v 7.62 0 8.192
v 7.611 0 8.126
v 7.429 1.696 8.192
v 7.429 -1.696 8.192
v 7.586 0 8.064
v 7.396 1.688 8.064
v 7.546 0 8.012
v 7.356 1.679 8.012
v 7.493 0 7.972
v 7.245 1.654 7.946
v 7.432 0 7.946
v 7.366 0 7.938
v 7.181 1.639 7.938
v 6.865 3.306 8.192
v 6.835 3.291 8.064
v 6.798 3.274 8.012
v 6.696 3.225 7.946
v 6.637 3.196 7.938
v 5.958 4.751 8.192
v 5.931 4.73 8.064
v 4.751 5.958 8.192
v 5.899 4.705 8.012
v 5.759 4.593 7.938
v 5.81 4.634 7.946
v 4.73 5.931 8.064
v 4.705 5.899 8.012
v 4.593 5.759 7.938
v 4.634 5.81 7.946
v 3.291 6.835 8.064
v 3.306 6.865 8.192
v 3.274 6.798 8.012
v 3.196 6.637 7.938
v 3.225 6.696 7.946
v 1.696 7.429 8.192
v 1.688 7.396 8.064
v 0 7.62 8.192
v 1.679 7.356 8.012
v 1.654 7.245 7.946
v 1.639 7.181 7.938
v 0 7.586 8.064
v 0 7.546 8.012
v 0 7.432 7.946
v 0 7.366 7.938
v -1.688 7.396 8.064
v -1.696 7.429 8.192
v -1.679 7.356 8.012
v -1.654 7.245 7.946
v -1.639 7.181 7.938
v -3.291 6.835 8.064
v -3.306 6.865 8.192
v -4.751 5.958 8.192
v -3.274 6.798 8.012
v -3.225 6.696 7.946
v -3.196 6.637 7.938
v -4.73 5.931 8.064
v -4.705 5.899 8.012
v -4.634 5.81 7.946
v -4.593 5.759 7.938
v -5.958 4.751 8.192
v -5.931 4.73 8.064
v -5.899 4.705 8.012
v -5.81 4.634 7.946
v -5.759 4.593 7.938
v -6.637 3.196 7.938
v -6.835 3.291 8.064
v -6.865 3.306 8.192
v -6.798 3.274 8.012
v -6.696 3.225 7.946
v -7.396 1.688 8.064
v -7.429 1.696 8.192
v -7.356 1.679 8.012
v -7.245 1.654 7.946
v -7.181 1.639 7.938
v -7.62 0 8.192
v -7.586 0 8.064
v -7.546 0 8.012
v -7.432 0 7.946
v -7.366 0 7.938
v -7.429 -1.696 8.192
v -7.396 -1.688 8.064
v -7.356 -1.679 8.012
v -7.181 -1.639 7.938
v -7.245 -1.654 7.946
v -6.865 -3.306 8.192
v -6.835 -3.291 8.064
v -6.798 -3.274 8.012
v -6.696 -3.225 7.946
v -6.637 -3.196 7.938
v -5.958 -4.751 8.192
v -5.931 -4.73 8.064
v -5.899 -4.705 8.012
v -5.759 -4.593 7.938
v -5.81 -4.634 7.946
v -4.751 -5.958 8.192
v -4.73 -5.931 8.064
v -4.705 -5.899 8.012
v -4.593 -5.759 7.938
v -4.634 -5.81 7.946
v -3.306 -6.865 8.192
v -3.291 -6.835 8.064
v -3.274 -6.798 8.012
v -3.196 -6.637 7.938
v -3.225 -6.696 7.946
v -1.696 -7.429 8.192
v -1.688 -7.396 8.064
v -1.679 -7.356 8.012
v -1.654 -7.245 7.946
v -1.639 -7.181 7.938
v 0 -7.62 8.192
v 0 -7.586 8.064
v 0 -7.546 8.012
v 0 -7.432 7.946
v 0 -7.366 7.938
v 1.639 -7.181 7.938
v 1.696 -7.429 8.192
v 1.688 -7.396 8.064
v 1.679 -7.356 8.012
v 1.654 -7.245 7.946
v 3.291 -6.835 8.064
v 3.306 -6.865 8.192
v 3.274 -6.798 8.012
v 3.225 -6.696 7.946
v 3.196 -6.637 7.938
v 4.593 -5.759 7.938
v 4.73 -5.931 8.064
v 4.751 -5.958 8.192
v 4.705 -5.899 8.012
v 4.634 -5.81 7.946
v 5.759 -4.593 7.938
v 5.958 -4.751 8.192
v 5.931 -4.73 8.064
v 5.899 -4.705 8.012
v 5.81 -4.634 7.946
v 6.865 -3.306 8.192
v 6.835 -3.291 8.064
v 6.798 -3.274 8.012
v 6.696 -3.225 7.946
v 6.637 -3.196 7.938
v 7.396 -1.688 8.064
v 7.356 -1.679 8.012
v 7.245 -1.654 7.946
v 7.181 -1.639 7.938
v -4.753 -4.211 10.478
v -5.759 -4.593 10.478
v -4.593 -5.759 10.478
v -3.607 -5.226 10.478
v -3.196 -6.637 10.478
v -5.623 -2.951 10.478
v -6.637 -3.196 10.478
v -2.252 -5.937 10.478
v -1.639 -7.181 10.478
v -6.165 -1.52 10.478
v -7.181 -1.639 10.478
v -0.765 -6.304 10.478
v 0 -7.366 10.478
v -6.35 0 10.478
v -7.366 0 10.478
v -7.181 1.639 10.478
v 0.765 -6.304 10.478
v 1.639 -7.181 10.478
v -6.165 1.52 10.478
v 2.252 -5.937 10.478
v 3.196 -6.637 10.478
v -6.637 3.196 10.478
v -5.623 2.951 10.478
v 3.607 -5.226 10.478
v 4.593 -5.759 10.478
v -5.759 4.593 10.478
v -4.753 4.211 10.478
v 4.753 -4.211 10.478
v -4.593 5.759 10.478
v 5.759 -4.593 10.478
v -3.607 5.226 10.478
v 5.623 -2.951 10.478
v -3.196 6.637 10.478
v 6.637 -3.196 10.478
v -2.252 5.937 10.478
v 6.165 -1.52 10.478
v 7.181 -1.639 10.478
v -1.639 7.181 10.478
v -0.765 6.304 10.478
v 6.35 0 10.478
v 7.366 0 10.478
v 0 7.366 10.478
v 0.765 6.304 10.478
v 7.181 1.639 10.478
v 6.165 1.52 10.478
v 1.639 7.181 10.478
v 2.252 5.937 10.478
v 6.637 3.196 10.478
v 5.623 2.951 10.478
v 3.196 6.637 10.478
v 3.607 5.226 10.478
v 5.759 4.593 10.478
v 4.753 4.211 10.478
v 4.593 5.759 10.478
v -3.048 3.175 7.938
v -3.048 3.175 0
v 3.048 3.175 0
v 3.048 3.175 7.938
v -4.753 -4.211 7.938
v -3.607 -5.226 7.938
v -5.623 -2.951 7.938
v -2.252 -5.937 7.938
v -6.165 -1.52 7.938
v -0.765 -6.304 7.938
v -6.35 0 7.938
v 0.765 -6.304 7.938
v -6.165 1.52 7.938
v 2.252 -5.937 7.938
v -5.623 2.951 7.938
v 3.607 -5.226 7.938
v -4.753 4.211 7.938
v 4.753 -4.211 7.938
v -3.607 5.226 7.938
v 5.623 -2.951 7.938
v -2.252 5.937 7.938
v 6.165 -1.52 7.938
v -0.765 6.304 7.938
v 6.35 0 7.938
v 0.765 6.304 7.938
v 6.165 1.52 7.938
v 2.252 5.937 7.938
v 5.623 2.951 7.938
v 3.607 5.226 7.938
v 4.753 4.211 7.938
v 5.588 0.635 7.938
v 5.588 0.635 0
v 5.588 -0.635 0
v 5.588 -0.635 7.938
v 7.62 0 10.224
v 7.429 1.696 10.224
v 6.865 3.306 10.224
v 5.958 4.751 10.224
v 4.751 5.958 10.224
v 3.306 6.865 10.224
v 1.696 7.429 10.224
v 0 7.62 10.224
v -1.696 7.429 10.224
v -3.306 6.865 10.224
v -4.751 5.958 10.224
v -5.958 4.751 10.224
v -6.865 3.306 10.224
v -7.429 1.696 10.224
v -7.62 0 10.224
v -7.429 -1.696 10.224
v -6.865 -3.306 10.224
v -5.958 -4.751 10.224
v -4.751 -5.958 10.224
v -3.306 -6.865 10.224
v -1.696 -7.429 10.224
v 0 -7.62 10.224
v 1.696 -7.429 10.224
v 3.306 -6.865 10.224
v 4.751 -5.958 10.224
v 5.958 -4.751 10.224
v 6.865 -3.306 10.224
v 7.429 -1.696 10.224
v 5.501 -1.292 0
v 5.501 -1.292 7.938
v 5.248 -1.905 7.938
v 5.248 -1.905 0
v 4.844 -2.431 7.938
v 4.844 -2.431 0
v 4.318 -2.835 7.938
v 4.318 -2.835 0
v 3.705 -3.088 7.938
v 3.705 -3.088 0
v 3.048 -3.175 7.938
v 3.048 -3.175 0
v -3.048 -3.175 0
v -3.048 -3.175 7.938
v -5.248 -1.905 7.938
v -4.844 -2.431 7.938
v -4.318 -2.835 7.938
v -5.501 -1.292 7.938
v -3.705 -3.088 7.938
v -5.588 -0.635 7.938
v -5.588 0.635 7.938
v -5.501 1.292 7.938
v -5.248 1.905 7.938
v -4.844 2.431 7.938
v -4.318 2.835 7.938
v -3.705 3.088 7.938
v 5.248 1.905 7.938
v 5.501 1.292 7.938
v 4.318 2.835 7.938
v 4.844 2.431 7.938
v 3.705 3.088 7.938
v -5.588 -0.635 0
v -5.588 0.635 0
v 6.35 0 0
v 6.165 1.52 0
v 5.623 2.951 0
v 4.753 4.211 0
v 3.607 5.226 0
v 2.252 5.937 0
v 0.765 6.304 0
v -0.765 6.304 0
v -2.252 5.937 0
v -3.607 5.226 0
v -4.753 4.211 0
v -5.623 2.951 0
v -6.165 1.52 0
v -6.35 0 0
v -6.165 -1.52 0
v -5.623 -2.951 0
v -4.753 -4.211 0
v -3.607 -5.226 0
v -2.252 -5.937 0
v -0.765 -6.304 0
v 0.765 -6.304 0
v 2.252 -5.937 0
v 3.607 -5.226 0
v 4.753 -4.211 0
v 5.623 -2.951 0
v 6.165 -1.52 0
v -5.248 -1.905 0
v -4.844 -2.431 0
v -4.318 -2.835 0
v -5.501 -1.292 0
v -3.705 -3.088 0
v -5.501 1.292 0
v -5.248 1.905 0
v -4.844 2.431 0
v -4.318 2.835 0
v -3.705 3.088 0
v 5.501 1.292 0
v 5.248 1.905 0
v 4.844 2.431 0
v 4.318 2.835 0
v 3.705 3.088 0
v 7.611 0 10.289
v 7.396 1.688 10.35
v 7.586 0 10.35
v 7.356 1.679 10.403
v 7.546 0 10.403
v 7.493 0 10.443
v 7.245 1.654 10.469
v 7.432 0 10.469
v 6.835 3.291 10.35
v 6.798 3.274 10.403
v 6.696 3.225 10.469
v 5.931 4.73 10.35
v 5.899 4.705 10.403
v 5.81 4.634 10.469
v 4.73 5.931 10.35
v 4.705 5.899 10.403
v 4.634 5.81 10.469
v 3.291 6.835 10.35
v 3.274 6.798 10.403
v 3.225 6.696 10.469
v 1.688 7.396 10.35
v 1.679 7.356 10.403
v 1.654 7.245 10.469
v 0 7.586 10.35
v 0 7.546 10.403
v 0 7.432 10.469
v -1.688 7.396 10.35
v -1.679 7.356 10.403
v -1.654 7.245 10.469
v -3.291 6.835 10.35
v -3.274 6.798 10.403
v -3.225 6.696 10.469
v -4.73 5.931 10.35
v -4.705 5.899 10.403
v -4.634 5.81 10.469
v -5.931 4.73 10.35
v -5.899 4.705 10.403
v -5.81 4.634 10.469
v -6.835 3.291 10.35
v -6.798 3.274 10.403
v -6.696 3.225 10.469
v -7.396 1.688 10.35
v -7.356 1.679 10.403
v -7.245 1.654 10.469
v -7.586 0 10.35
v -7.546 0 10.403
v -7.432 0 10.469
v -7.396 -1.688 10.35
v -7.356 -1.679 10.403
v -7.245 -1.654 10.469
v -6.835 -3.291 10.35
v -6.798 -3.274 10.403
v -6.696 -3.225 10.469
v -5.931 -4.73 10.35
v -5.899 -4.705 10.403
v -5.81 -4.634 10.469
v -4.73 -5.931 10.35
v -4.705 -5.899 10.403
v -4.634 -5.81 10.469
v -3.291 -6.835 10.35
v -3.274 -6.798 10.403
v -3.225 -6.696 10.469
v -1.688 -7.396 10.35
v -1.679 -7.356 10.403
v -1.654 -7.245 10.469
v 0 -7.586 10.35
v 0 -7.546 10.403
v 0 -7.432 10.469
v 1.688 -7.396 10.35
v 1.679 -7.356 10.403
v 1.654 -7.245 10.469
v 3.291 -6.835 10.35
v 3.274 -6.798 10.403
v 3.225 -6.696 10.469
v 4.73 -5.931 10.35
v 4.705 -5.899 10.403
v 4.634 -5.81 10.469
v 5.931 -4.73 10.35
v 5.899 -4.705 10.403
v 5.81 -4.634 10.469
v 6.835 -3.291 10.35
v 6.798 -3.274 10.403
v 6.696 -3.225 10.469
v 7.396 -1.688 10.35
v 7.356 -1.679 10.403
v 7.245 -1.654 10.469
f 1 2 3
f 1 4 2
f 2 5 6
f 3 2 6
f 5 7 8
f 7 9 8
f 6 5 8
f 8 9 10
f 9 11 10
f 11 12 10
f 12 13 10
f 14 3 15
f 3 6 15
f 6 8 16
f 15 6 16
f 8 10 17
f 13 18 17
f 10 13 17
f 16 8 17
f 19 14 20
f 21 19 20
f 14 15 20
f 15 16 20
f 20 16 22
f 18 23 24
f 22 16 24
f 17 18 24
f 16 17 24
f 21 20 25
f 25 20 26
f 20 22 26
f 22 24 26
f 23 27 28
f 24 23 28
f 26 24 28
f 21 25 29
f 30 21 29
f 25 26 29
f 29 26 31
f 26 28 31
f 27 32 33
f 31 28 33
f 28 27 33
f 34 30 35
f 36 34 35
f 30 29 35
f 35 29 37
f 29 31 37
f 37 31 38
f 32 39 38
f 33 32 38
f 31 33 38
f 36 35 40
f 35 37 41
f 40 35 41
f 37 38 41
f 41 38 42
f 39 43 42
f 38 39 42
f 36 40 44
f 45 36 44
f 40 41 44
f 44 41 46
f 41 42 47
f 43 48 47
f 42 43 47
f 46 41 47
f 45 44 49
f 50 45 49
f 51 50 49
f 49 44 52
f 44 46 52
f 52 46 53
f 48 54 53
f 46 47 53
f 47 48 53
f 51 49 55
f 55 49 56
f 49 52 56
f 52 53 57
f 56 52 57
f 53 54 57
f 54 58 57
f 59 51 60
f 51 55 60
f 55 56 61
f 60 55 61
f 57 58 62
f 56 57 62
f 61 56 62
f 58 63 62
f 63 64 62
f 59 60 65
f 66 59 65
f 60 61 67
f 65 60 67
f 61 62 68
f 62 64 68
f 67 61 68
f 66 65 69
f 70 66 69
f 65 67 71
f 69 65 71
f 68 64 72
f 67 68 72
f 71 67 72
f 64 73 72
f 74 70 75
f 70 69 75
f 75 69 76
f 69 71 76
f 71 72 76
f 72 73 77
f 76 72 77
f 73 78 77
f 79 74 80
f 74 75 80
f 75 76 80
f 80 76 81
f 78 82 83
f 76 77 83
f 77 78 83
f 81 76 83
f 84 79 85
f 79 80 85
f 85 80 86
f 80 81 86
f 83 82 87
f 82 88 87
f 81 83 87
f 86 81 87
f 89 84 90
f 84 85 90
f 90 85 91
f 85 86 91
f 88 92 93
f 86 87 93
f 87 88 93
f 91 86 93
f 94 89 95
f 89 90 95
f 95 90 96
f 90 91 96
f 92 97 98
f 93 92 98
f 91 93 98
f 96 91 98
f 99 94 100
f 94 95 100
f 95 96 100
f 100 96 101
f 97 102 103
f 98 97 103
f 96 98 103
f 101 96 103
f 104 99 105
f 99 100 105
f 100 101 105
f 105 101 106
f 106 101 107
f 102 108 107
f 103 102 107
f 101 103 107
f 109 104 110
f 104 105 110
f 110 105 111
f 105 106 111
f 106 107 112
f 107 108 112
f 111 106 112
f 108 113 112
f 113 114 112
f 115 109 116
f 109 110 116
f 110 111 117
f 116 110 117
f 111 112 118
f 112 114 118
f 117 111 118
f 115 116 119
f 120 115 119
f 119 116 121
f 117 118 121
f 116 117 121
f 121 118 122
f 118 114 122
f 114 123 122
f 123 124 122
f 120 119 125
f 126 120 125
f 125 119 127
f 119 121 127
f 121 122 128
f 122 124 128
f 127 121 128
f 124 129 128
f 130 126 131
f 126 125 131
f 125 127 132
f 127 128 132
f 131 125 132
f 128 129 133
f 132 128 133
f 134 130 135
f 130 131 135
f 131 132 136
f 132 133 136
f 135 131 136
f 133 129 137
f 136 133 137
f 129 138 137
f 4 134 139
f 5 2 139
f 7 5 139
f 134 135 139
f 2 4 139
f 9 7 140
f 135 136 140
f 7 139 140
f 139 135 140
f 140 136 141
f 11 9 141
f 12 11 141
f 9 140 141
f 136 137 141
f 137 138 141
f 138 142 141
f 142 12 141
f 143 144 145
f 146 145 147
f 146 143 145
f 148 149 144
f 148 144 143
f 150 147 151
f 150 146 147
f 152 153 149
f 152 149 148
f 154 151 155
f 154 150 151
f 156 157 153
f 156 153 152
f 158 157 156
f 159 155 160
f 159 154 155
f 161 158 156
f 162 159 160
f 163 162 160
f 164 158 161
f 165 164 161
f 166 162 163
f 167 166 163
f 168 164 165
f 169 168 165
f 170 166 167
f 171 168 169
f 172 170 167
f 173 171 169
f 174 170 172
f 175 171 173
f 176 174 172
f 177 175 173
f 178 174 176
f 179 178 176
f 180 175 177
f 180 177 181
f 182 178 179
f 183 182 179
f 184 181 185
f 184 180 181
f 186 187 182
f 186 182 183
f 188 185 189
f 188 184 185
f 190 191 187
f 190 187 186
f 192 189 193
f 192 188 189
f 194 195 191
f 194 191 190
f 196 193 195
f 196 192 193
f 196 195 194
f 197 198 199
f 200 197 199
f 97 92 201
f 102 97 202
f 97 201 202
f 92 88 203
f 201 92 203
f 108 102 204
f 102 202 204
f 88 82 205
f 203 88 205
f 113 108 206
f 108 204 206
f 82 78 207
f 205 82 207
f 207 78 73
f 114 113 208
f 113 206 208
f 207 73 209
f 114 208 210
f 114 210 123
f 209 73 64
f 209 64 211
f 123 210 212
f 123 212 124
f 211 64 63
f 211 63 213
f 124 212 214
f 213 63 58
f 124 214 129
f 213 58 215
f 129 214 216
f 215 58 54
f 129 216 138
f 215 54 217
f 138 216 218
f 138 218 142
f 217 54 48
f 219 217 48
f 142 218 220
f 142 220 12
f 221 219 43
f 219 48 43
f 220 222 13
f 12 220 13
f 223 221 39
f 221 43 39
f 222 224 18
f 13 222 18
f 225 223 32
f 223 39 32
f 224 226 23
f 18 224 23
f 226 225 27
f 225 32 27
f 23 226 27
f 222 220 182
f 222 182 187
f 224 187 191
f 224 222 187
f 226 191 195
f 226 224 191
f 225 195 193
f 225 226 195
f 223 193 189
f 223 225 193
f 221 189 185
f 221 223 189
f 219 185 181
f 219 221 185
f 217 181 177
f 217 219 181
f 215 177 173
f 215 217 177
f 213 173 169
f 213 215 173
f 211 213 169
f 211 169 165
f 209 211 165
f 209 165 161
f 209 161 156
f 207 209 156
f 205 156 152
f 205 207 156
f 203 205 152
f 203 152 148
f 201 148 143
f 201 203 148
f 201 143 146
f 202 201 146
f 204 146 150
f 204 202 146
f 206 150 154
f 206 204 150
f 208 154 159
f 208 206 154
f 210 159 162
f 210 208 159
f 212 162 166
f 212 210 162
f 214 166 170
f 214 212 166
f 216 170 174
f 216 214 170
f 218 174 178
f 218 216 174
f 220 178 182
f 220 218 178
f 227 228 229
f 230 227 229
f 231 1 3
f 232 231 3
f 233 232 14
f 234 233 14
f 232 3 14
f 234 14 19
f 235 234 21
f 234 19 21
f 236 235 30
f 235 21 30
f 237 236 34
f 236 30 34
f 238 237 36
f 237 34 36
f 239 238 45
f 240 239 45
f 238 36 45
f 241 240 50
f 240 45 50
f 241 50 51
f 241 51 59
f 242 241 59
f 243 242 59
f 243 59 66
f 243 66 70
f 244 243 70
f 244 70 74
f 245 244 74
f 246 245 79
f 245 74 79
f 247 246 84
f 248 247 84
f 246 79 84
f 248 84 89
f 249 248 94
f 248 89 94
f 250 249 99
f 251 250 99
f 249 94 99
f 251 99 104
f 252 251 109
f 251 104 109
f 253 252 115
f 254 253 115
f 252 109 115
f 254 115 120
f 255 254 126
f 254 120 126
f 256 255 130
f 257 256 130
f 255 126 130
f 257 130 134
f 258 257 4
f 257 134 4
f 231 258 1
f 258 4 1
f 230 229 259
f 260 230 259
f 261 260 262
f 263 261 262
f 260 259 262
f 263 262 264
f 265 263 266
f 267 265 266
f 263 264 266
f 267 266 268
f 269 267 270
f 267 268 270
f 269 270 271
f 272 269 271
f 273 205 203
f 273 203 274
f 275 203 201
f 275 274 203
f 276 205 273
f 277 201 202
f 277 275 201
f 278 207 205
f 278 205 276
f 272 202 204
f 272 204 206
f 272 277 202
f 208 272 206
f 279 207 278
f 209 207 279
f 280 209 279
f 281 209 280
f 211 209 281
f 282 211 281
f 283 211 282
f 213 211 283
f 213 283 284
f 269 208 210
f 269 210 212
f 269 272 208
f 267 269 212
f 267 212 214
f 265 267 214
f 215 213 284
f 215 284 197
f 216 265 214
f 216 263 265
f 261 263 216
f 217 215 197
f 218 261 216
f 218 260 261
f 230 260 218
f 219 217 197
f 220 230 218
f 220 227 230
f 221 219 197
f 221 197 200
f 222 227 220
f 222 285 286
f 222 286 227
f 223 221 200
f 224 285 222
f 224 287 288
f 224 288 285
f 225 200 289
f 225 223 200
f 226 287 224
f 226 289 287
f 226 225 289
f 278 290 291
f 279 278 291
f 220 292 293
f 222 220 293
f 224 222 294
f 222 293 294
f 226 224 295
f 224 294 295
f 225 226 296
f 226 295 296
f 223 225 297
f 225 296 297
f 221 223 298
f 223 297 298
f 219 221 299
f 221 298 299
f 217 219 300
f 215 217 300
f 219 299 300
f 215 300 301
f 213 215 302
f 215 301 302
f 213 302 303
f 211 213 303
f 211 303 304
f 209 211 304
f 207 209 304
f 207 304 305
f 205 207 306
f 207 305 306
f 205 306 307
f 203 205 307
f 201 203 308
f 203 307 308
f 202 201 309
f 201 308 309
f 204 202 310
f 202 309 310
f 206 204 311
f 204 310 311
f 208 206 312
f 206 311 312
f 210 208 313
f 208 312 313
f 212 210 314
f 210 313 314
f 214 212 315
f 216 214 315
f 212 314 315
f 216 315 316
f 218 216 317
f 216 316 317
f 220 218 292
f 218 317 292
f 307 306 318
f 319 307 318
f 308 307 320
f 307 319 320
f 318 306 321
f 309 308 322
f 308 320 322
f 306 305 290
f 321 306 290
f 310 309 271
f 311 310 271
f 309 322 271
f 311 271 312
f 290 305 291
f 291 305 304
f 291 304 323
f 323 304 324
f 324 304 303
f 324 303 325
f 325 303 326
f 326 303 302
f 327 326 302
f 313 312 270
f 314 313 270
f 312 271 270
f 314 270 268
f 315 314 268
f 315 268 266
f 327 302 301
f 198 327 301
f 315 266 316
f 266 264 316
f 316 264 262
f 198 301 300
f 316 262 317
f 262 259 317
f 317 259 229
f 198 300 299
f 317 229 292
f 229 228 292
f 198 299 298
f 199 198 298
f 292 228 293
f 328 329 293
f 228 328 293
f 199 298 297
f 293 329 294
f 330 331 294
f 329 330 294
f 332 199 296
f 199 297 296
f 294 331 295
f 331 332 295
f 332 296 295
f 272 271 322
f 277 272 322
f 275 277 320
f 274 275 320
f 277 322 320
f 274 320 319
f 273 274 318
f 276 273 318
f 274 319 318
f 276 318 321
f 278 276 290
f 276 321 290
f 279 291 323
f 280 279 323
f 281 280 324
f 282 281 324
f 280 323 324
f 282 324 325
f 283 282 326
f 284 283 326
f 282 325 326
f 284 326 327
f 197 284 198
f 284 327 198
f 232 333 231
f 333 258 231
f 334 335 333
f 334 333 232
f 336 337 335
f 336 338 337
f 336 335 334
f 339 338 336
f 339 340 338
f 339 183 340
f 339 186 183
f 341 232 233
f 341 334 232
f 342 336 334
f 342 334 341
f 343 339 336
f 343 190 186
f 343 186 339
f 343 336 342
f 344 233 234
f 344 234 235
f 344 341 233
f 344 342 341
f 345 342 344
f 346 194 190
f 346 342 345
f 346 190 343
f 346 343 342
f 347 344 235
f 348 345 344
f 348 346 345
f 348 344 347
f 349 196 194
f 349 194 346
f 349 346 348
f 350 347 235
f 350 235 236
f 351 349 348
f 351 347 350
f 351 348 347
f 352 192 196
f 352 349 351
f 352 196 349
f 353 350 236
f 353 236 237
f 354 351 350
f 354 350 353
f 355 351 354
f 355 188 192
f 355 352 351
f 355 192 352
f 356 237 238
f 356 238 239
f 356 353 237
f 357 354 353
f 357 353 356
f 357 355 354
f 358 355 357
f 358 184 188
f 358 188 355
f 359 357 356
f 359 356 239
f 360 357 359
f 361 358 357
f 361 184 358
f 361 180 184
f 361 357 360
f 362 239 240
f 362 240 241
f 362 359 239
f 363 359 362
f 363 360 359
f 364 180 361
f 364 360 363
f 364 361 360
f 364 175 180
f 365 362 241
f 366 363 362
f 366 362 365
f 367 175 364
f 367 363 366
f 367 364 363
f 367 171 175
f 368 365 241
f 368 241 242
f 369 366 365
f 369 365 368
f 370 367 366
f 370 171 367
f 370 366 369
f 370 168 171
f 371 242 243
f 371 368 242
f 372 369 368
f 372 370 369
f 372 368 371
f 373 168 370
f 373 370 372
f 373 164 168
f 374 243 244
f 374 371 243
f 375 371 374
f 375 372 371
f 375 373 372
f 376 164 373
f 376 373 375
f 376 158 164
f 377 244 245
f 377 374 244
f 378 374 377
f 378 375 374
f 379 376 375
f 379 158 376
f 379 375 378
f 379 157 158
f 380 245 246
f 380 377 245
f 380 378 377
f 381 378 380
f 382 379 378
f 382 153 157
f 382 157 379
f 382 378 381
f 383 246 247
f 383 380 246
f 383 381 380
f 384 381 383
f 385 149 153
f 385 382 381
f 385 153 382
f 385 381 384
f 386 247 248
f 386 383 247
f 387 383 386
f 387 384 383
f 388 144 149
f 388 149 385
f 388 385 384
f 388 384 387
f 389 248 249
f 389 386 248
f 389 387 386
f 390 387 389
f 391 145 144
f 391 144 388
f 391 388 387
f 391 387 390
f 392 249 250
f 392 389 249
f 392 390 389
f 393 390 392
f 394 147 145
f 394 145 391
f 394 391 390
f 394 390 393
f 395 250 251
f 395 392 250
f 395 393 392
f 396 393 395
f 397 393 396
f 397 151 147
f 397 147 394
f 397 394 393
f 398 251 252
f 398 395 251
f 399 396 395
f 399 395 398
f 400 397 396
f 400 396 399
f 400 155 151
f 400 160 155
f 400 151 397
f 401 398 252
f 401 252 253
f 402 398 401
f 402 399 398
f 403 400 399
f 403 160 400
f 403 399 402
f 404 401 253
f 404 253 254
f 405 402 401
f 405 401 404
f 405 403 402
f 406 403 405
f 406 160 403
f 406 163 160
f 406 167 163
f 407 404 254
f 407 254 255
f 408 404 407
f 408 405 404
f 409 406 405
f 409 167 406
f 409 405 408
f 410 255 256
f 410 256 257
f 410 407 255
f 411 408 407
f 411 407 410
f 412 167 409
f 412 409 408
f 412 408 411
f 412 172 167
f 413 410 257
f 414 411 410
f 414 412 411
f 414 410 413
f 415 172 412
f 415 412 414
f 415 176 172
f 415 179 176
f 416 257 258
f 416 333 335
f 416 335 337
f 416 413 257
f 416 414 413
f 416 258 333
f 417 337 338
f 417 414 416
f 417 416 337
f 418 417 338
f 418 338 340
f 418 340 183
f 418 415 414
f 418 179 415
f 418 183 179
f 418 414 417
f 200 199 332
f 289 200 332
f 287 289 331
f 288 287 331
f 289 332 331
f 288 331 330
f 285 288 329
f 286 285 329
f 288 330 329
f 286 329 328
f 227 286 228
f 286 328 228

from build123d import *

# Parameters (mm, degrees)
SKETCH1_R           = 6.35
BOSS_EXTRUDE1_DEPTH = 7.9375
SKETCH2_R           = 7.62
SKETCH2_R_2         = 6.35
BOSS_EXTRUDE2_DEPTH = 2.54
FILLET1_R           = 0.254


with BuildPart() as part:
    # Sketch1 → Boss-Extrude1 (new body)
    with BuildSketch(Plane.XY):
        Circle(SKETCH1_R)
        with BuildLine():
            Line((3.048, -3.175), (-3.048, -3.175))
            ThreePointArc((-3.048, -3.175), (-4.844051224, -2.431051224), (-5.588, -0.635))
            Line((-5.588, -0.635), (-5.588, 0.635))
            ThreePointArc((-5.588, 0.635), (-4.844051224, 2.431051224), (-3.048, 3.175))
            Line((-3.048, 3.175), (3.048, 3.175))
            ThreePointArc((3.048, 3.175), (4.844051224, 2.431051224), (5.588, 0.635))
            Line((5.588, 0.635), (5.588, -0.635))
            ThreePointArc((5.588, -0.635), (4.844051224, -2.431051224), (3.048, -3.175))
        make_face(mode=Mode.SUBTRACT)
    extrude(amount=BOSS_EXTRUDE1_DEPTH)


with BuildPart() as body_2:
    # Sketch2 → Boss-Extrude2 (new body)
    with BuildSketch(Plane.XY.offset(7.9375)):
        Circle(SKETCH2_R)
        Circle(SKETCH2_R_2, mode=Mode.SUBTRACT)
    extrude(amount=BOSS_EXTRUDE2_DEPTH)

    # Fillet1
    fillet1_edges = [body_2.edges().sort_by_distance(p)[0] for p in [
        (-7.62, 0, 7.9375),
        (-7.62, 0, 10.4775),
    ]]
    fillet(fillet1_edges, radius=FILLET1_R)


solid = Compound([part.part, body_2.part])
